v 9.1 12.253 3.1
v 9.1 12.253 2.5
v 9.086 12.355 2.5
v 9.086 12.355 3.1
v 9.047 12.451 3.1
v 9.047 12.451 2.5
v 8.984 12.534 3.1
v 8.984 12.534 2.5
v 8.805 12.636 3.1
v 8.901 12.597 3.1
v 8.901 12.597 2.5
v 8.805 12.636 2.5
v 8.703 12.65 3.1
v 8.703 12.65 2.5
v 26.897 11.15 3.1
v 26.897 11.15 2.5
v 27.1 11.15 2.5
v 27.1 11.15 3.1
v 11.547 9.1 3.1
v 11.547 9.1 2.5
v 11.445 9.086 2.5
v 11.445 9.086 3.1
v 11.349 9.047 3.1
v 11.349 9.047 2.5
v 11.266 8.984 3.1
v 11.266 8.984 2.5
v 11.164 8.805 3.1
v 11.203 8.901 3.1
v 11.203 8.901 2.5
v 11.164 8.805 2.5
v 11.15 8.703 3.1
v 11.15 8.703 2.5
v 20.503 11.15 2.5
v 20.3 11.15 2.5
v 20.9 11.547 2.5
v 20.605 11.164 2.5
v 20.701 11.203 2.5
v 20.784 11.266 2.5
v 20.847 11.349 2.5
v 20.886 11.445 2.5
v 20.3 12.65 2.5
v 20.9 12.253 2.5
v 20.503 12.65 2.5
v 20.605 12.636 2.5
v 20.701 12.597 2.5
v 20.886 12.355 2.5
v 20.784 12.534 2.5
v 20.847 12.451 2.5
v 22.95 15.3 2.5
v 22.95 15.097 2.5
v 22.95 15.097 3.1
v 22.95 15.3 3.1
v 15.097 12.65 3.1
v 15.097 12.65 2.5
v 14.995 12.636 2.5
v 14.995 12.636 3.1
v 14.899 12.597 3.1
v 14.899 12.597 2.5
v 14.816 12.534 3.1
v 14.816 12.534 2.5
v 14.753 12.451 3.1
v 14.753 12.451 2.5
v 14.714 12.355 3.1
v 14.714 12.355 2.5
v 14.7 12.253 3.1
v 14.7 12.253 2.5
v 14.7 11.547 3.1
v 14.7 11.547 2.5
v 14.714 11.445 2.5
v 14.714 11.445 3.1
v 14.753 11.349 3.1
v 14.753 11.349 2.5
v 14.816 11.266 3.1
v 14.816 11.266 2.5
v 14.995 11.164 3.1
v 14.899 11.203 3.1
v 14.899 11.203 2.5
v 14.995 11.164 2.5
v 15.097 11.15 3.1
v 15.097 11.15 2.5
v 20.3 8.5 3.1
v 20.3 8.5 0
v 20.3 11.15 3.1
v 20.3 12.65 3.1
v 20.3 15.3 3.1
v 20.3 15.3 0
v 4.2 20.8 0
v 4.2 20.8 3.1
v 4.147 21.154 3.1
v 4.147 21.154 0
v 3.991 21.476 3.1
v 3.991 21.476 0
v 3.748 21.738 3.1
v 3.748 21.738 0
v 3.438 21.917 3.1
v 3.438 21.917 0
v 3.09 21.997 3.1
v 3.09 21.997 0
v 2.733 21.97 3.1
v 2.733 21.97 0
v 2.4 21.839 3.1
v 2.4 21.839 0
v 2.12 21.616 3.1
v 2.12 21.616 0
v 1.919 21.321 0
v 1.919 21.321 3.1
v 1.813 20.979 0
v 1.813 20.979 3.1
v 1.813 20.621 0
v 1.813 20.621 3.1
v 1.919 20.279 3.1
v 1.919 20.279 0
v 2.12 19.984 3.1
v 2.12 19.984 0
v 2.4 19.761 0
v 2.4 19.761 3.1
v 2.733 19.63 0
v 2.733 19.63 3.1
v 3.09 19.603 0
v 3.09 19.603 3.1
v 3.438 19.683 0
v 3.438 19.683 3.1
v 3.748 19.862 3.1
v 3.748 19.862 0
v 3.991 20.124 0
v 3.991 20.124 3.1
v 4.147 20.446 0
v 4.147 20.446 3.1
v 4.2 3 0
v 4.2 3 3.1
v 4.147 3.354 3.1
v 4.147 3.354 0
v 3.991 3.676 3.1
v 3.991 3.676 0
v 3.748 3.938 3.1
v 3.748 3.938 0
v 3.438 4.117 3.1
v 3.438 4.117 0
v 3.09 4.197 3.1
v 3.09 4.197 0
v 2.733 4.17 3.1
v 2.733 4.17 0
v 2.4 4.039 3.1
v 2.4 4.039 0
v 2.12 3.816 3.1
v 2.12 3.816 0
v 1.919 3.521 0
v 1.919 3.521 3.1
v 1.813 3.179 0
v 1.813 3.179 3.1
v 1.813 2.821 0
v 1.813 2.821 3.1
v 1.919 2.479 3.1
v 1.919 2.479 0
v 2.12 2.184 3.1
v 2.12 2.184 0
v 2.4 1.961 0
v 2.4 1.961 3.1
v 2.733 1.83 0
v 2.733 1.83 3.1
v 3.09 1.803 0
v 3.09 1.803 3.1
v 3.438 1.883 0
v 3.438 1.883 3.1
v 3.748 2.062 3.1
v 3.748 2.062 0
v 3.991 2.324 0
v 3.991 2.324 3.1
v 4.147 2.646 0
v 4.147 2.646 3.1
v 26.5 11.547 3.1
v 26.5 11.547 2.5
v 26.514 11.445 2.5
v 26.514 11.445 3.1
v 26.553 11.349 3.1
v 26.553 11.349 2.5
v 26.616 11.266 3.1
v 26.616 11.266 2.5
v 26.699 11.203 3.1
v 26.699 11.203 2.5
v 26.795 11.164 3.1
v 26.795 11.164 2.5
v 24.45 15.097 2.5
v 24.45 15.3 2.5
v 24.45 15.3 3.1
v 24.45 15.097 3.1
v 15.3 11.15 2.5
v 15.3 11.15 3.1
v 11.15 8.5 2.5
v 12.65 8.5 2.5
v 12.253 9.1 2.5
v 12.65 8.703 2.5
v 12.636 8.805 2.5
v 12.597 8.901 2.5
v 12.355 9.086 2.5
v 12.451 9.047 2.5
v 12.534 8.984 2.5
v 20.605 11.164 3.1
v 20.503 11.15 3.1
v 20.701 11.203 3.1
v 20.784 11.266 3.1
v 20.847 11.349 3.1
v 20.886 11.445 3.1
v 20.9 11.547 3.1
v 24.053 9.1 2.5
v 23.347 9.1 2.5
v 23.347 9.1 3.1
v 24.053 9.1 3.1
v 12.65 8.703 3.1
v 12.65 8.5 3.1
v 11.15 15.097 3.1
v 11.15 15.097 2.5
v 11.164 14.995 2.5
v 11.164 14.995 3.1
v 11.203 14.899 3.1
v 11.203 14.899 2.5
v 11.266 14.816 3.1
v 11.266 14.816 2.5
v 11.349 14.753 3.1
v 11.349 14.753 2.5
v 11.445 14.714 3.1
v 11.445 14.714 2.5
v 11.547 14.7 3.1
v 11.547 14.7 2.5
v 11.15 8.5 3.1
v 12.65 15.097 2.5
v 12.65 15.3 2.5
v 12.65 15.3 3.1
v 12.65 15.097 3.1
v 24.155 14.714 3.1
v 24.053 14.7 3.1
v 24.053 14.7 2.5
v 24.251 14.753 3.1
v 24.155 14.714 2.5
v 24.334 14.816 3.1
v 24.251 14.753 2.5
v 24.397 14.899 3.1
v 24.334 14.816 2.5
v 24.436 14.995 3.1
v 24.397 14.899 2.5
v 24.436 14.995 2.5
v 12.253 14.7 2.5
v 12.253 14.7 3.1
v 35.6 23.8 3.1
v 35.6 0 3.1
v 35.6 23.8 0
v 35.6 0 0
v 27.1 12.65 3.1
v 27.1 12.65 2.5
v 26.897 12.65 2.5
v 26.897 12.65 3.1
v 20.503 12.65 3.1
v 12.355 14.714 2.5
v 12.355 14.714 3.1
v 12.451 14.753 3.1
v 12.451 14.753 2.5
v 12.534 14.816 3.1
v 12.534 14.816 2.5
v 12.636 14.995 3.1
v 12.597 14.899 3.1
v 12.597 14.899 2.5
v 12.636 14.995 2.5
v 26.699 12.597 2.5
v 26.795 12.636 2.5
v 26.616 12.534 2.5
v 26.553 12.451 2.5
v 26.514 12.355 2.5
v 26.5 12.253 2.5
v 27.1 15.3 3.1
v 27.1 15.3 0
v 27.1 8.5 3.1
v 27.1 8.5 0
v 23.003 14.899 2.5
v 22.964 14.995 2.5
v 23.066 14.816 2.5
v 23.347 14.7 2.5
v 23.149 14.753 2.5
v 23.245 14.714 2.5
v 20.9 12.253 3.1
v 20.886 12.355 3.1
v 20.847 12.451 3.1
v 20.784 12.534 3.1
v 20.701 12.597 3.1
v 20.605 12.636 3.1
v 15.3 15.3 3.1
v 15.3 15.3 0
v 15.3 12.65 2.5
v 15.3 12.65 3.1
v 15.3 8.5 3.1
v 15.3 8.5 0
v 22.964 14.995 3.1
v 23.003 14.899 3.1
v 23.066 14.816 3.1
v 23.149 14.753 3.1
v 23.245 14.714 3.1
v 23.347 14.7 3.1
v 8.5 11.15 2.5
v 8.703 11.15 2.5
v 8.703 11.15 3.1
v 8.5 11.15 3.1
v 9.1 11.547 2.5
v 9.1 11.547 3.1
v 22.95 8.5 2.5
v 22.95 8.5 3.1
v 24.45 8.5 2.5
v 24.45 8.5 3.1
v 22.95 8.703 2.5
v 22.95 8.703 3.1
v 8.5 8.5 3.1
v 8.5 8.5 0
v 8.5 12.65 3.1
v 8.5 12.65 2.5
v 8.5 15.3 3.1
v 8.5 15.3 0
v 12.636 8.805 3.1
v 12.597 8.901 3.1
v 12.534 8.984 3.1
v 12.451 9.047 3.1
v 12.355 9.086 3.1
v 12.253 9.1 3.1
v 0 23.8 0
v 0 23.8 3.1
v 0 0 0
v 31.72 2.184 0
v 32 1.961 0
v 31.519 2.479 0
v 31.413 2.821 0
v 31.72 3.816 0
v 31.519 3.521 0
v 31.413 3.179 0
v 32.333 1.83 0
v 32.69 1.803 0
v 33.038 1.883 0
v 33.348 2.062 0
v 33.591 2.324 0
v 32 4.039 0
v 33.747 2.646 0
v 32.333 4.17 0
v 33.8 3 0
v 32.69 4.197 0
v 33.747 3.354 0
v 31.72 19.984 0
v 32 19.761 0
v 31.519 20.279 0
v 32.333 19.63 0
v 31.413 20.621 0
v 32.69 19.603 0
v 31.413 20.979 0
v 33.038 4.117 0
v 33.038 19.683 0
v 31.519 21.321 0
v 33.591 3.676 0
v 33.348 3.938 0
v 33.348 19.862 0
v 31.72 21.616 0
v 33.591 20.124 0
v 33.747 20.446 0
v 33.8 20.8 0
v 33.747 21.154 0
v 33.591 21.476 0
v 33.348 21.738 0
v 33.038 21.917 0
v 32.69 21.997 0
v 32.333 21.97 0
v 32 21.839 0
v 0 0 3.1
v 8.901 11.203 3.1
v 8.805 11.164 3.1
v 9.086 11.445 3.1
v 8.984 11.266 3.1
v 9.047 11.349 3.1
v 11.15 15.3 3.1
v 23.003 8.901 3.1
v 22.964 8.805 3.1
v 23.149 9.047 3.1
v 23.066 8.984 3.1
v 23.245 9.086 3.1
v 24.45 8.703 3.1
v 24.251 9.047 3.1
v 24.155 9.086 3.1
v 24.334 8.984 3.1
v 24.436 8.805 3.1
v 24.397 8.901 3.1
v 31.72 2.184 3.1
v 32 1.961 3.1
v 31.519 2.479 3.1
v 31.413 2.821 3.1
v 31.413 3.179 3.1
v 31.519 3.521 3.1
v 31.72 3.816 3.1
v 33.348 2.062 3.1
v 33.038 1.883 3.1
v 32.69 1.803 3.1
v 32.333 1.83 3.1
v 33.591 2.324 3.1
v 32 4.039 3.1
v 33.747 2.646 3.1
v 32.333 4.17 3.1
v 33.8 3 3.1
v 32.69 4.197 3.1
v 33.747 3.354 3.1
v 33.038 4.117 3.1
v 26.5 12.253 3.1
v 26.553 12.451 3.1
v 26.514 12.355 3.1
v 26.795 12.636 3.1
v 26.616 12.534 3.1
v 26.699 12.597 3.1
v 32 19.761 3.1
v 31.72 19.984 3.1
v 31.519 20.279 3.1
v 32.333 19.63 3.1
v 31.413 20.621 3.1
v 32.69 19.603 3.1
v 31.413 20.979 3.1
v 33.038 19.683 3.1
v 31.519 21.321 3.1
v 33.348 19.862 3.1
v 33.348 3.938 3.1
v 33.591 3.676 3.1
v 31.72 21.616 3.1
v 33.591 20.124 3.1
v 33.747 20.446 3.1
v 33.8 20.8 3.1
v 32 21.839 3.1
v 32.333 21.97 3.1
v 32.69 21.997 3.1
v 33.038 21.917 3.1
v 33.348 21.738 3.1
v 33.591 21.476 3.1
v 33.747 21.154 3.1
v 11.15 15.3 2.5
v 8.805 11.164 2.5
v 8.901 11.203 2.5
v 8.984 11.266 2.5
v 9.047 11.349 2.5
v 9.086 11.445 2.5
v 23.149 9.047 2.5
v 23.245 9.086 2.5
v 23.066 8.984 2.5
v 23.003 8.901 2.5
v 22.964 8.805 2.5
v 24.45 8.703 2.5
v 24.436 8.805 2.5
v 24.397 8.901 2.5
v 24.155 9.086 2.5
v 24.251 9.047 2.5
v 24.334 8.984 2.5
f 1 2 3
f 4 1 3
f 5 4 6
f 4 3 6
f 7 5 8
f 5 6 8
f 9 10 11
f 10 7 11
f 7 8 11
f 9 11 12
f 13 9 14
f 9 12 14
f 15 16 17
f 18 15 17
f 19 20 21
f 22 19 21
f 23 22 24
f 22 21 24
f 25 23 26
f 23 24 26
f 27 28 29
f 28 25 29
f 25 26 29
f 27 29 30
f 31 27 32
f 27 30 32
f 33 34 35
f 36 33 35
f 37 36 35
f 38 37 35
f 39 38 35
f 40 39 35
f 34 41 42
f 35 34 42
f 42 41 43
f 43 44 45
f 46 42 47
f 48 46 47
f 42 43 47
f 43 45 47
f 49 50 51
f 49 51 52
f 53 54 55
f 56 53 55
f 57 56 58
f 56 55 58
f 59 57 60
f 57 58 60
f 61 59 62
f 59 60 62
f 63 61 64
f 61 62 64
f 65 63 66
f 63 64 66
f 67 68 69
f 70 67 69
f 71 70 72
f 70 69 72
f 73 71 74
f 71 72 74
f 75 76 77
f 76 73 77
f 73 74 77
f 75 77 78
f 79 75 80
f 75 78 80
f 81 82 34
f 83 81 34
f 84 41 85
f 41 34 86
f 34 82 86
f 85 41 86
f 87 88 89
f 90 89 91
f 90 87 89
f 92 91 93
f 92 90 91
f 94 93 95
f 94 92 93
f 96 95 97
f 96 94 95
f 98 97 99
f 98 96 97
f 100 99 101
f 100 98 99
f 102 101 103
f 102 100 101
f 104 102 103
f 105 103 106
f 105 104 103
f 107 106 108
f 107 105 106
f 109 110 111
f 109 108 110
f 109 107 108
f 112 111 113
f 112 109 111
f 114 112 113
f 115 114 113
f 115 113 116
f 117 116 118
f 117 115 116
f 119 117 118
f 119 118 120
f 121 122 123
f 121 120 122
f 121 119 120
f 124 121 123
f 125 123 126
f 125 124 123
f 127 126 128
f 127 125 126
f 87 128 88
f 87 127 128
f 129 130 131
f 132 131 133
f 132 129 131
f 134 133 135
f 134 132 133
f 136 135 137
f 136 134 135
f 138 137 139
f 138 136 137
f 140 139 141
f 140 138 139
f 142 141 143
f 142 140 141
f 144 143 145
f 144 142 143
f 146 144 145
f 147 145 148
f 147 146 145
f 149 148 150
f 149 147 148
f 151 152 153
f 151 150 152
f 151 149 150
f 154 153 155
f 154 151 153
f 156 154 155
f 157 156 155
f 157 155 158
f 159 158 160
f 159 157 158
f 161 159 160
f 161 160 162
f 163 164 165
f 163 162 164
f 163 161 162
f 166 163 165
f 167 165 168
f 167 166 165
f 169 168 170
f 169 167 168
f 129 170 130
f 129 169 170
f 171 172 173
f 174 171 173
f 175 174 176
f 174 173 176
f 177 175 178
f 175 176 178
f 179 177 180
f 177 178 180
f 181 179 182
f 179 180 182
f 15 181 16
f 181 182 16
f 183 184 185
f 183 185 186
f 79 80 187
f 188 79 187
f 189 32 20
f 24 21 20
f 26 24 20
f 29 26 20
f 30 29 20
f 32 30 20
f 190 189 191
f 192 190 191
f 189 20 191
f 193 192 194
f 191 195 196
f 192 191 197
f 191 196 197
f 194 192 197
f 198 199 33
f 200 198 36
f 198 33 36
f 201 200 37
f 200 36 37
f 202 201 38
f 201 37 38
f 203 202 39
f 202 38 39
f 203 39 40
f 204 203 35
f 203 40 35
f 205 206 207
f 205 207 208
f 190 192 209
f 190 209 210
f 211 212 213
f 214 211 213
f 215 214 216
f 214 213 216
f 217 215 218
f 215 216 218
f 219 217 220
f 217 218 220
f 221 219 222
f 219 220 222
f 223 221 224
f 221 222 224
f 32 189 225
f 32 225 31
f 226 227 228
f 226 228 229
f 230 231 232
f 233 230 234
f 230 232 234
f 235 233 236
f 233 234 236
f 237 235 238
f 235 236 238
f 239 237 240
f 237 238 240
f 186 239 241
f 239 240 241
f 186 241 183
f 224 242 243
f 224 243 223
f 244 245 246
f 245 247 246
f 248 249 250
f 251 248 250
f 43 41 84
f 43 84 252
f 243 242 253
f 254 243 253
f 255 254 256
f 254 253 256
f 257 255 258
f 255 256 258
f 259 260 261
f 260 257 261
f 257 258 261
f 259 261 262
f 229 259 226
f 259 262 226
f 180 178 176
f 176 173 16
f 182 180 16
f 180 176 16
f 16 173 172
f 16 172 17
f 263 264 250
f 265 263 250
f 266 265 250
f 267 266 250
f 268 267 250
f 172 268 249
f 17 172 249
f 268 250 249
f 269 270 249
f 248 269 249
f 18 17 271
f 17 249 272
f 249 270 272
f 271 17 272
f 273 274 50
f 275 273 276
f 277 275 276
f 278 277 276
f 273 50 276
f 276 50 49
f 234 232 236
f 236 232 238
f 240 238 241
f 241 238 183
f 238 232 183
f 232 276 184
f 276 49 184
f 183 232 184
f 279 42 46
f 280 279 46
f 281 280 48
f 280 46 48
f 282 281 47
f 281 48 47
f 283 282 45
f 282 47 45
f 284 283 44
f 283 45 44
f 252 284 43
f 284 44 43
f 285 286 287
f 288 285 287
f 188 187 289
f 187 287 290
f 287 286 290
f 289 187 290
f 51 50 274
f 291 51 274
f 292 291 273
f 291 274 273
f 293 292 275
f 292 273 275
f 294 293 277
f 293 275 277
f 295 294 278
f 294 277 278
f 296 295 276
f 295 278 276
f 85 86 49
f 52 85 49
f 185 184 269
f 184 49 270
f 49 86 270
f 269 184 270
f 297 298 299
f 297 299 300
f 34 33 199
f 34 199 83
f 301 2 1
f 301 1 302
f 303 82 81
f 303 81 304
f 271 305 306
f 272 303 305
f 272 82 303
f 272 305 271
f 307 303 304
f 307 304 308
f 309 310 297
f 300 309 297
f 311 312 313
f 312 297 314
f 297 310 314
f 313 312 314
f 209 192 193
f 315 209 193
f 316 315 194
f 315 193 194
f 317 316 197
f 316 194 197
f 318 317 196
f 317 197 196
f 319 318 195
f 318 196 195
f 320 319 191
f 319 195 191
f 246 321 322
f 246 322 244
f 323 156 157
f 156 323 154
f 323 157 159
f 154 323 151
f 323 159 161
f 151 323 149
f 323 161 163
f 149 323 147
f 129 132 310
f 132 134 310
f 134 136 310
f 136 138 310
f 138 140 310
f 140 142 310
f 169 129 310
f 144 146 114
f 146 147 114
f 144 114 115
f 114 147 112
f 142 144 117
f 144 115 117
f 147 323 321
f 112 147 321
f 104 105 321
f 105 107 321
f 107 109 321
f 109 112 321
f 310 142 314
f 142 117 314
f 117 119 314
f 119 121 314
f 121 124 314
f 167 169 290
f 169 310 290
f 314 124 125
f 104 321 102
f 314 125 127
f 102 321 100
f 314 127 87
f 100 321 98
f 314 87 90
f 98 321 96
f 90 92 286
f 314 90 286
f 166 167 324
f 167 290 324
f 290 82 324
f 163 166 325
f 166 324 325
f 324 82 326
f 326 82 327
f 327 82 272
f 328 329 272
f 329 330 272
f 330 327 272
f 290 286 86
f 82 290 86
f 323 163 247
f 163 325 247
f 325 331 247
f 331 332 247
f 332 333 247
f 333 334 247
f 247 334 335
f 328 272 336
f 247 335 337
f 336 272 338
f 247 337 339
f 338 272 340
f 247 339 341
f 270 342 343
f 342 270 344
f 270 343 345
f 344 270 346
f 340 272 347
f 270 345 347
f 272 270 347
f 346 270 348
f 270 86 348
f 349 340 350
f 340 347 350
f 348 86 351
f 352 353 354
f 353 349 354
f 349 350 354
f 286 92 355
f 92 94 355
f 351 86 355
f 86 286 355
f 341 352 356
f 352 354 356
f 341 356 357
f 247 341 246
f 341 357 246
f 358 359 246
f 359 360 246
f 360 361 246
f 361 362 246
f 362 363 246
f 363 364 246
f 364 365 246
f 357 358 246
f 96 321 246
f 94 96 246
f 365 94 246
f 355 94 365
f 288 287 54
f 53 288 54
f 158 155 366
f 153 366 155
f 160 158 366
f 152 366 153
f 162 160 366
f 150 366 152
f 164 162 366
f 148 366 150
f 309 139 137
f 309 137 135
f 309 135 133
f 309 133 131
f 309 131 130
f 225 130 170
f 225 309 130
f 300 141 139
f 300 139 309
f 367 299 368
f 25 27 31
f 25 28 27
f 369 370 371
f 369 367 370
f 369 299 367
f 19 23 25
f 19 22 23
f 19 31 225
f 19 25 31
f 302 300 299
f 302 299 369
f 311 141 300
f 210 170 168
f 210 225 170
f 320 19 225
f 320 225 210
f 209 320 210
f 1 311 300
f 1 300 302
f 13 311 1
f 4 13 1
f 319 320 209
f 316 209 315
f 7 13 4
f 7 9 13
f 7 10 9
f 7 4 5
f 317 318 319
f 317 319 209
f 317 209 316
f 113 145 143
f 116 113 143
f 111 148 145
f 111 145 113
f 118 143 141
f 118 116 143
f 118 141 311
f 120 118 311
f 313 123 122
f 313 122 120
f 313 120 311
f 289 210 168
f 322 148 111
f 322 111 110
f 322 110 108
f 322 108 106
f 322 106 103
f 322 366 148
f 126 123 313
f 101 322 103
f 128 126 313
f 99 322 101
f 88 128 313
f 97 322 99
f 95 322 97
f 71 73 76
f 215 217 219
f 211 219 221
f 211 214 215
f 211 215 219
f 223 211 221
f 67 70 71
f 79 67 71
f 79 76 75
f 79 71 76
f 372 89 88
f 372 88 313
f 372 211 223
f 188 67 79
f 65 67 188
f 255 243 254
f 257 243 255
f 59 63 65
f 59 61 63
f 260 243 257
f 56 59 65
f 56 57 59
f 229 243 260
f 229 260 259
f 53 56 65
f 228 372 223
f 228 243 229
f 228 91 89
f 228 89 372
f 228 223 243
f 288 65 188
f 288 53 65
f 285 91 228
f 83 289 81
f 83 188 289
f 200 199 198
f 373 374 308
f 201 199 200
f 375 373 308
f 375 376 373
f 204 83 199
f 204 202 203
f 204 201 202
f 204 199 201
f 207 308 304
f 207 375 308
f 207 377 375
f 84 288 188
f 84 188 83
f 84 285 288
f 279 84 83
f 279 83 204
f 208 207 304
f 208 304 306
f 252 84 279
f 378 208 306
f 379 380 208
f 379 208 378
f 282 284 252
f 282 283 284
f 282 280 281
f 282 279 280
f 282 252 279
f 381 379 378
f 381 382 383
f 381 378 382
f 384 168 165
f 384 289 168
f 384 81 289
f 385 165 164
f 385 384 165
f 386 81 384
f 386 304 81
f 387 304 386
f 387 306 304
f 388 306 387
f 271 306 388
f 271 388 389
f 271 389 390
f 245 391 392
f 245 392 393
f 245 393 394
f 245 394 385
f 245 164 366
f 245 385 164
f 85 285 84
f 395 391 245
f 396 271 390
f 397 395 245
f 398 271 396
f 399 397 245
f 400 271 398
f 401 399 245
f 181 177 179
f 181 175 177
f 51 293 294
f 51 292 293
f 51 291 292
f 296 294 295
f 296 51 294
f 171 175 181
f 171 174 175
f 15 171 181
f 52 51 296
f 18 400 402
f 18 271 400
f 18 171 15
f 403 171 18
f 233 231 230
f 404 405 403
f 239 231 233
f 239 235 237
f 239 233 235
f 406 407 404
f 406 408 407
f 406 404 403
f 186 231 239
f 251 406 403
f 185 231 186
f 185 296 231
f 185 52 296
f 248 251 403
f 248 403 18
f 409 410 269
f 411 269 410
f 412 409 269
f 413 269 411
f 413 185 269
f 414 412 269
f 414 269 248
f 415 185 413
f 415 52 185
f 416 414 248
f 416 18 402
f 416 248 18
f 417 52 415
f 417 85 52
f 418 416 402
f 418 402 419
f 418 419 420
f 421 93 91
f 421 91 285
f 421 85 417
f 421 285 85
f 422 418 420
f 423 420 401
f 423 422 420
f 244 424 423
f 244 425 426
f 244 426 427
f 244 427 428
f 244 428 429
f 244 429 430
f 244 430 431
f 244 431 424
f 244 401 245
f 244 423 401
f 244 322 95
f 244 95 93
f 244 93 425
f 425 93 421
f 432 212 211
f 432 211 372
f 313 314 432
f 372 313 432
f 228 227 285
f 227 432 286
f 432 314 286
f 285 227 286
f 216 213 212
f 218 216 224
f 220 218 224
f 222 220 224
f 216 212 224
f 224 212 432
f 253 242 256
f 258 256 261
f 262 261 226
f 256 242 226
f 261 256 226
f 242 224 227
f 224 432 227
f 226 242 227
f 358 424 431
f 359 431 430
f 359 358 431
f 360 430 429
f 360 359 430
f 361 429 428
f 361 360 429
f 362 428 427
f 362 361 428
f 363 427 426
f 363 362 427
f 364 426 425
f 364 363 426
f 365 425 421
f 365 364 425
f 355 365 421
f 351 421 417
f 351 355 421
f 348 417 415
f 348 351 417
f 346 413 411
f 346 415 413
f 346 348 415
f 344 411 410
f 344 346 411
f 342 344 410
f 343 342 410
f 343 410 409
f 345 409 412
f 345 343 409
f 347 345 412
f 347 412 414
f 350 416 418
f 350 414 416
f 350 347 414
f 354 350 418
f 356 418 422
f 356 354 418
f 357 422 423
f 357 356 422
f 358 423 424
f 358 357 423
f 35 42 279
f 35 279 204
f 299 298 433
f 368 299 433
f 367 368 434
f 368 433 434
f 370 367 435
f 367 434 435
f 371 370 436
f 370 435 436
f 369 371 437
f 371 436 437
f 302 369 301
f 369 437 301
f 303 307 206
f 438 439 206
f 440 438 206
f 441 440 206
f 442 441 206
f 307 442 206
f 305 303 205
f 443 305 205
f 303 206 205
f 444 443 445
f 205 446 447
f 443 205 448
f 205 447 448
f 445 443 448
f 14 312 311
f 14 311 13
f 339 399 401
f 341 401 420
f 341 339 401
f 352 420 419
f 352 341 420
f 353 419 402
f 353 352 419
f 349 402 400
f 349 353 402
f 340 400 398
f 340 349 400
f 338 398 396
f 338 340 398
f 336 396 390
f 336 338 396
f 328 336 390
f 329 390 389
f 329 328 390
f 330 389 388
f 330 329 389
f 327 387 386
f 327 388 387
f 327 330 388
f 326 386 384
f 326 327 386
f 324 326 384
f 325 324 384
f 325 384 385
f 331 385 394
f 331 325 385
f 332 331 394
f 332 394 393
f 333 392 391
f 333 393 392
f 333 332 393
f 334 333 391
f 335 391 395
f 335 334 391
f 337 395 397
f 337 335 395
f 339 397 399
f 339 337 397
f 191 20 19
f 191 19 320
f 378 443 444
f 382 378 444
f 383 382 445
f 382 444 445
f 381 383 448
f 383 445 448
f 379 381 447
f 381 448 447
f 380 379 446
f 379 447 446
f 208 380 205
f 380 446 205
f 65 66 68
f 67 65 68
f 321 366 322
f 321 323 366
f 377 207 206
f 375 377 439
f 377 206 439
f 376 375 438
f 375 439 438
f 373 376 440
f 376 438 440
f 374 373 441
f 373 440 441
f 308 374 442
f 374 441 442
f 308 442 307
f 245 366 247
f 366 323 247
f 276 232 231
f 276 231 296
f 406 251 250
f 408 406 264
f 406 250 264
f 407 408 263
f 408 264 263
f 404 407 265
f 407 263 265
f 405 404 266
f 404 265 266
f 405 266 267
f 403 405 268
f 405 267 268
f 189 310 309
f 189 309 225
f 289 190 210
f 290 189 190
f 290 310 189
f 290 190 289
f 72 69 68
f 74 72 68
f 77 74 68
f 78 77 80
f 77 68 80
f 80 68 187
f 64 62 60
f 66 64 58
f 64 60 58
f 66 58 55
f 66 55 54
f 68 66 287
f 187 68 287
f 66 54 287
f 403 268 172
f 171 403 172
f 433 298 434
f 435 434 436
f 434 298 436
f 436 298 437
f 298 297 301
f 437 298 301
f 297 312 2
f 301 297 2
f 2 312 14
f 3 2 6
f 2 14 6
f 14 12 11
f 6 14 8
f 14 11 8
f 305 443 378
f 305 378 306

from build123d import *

# Parameters (mm, degrees)
CYLINDER002_R     = 1.2
CYLINDER002_DEPTH = 10
ARRAY006_X_COUNT  = 2
ARRAY006_X_PITCH  = 29.6
ARRAY006_Y_COUNT  = 2
ARRAY006_Y_PITCH  = 17.8
PAD_DEPTH         = 10
ARRAY005_X_COUNT  = 2
ARRAY005_X_PITCH  = 11.8
BOX010_W          = 35.6
BOX010_H          = 23.8
BOX010_DEPTH      = 0.6
CYLINDER_R        = 1.2
CYLINDER_DEPTH    = 10
ARRAY001_X_COUNT  = 2
ARRAY001_X_PITCH  = 29.6
ARRAY001_Y_COUNT  = 2
ARRAY001_Y_PITCH  = 17.8
BOX001_W          = 6.8
BOX001_H          = 6.8
BOX001_DEPTH      = 10
ARRAY_X_COUNT     = 2
ARRAY_X_PITCH     = 11.8
BOX_W             = 35.6
BOX_H             = 23.8
BOX_DEPTH         = 2.5


with BuildPart() as bolt_hole_array003:
    # Cylinder002 → Cylinder002 (new body)
    with BuildSketch(Plane.XY):
        Circle(CYLINDER002_R)
    extrude(amount=CYLINDER002_DEPTH)

    # Array006 X: bolt hole array003 ×2


with BuildPart() as bolt_hole_array003_1:
    add(bolt_hole_array003.part)
    with Locations(*[(i * ARRAY006_X_PITCH, 0, 0) for i in range(1, ARRAY006_X_COUNT)]):
        add(bolt_hole_array003.part)

    # Array006 Y: bolt hole array003 ×2


with BuildPart() as bolt_hole_array003_2:
    add(bolt_hole_array003_1.part)
    with Locations(*[(0, i * ARRAY006_Y_PITCH, 0) for i in range(1, ARRAY006_Y_COUNT)]):
        add(bolt_hole_array003_1.part)


with BuildPart() as bolt_hole_array003_3:
    # Array006 placement: moved
    add(bolt_hole_array003_2.part.moved(Location((3, 3, 0))))


with BuildPart() as hole_fusion001:
    # Sketch001 → Pad (new body)
    with BuildSketch(Plane.XY):
        with BuildLine():
            Line((-3.4, -0.75), (-3.4, -3.4))
            Line((-3.4, -3.4), (-0.75, -3.4))
            Line((-0.75, -3.4), (-0.75, -3.197425))
            ThreePointArc((-0.352575, -2.8), (-0.633597, -2.916403), (-0.75, -3.197425))
            Line((-0.352575, -2.8), (0.352575, -2.8))
            ThreePointArc((0.75, -3.197425), (0.633597, -2.916403), (0.352575, -2.8))
            Line((0.75, -3.197425), (0.75, -3.4))
            Line((3.4, -3.4), (0.75, -3.4))
            Line((3.4, -0.75), (3.4, -3.4))
            Line((3.197425, -0.75), (3.4, -0.75))
            ThreePointArc((2.8, -0.352575), (2.916403, -0.633597), (3.197425, -0.75))
            Line((2.8, 0.352575), (2.8, -0.352575))
            ThreePointArc((3.197425, 0.75), (2.916403, 0.633597), (2.8, 0.352575))
            Line((3.4, 0.75), (3.197425, 0.75))
            Line((3.4, 3.4), (3.4, 0.75))
            Line((0.75, 3.4), (3.4, 3.4))
            Line((0.75, 3.4), (0.75, 3.197425))
            ThreePointArc((0.352575, 2.8), (0.633597, 2.916403), (0.75, 3.197425))
            Line((0.352575, 2.8), (-0.352575, 2.8))
            ThreePointArc((-0.75, 3.197425), (-0.633597, 2.916403), (-0.352575, 2.8))
            Line((-0.75, 3.197425), (-0.75, 3.4))
            Line((-3.4, 3.4), (-0.75, 3.4))
            Line((-3.4, 0.75), (-3.4, 3.4))
            Line((-3.4, 0.75), (-3.197425, 0.75))
            ThreePointArc((-2.8, 0.352575), (-2.916403, 0.633597), (-3.197425, 0.75))
            Line((-2.8, 0.352575), (-2.8, -0.352575))
            ThreePointArc((-3.197425, -0.75), (-2.916403, -0.633597), (-2.8, -0.352575))
            Line((-3.197425, -0.75), (-3.4, -0.75))
        make_face()
    extrude(amount=PAD_DEPTH)

    # Array005 X: hole fusion001 ×2


with BuildPart() as hole_fusion001_1:
    add(hole_fusion001.part)
    with Locations(*[(i * ARRAY005_X_PITCH, 0, 0) for i in range(1, ARRAY005_X_COUNT)]):
        add(hole_fusion001.part)


with BuildPart() as hole_fusion001_2:
    # Array005 placement: moved
    add(hole_fusion001_1.part.moved(Location((11.9, 11.9, 0))))

    # Fusion006: union bolt hole array003
    add(bolt_hole_array003_3.part)


with BuildPart() as btn_middle_plate_top_cut:
    # Box010 → Box010 (new body)
    with BuildSketch(Plane.XY):
        with Locations((17.8, 11.9)):
            Rectangle(BOX010_W, BOX010_H)
    extrude(amount=BOX010_DEPTH)

    # Cut005: cut hole fusion001
    add(hole_fusion001_2.part, mode=Mode.SUBTRACT)


with BuildPart() as btn_middle_plate_top_cut_1:
    # Cut005 placement: moved
    add(btn_middle_plate_top_cut.part.moved(Location((0, 0, 2.5))))


with BuildPart() as bolt_hole_array:
    # Cylinder → Cylinder (new body)
    with BuildSketch(Plane.XY):
        Circle(CYLINDER_R)
    extrude(amount=CYLINDER_DEPTH)

    # Array001 X: bolt hole array ×2


with BuildPart() as bolt_hole_array_1:
    add(bolt_hole_array.part)
    with Locations(*[(i * ARRAY001_X_PITCH, 0, 0) for i in range(1, ARRAY001_X_COUNT)]):
        add(bolt_hole_array.part)

    # Array001 Y: bolt hole array ×2


with BuildPart() as bolt_hole_array_2:
    add(bolt_hole_array_1.part)
    with Locations(*[(0, i * ARRAY001_Y_PITCH, 0) for i in range(1, ARRAY001_Y_COUNT)]):
        add(bolt_hole_array_1.part)


with BuildPart() as bolt_hole_array_3:
    # Array001 placement: moved
    add(bolt_hole_array_2.part.moved(Location((3, 3, 0))))


with BuildPart() as hole_fusion:
    # Box001 → Box001 (new body)
    with BuildSketch(Plane.XY):
        with Locations((3.4, 3.4)):
            Rectangle(BOX001_W, BOX001_H)
    extrude(amount=BOX001_DEPTH)

    # Array X: hole fusion ×2


with BuildPart() as hole_fusion_1:
    add(hole_fusion.part)
    with Locations(*[(i * ARRAY_X_PITCH, 0, 0) for i in range(1, ARRAY_X_COUNT)]):
        add(hole_fusion.part)


with BuildPart() as hole_fusion_2:
    # Array placement: moved
    add(hole_fusion_1.part.moved(Location((8.5, 8.5, 0))))

    # Fusion: union bolt hole array
    add(bolt_hole_array_3.part)


with BuildPart() as btn_middle_plate_fusion:
    # Box → Box (new body)
    with BuildSketch(Plane.XY):
        with Locations((17.8, 11.9)):
            Rectangle(BOX_W, BOX_H)
    extrude(amount=BOX_DEPTH)

    # Cut: cut hole fusion
    add(hole_fusion_2.part, mode=Mode.SUBTRACT)

    # Fusion007: union btn middle plate top cut
    add(btn_middle_plate_top_cut_1.part)


solid = btn_middle_plate_fusion.part
